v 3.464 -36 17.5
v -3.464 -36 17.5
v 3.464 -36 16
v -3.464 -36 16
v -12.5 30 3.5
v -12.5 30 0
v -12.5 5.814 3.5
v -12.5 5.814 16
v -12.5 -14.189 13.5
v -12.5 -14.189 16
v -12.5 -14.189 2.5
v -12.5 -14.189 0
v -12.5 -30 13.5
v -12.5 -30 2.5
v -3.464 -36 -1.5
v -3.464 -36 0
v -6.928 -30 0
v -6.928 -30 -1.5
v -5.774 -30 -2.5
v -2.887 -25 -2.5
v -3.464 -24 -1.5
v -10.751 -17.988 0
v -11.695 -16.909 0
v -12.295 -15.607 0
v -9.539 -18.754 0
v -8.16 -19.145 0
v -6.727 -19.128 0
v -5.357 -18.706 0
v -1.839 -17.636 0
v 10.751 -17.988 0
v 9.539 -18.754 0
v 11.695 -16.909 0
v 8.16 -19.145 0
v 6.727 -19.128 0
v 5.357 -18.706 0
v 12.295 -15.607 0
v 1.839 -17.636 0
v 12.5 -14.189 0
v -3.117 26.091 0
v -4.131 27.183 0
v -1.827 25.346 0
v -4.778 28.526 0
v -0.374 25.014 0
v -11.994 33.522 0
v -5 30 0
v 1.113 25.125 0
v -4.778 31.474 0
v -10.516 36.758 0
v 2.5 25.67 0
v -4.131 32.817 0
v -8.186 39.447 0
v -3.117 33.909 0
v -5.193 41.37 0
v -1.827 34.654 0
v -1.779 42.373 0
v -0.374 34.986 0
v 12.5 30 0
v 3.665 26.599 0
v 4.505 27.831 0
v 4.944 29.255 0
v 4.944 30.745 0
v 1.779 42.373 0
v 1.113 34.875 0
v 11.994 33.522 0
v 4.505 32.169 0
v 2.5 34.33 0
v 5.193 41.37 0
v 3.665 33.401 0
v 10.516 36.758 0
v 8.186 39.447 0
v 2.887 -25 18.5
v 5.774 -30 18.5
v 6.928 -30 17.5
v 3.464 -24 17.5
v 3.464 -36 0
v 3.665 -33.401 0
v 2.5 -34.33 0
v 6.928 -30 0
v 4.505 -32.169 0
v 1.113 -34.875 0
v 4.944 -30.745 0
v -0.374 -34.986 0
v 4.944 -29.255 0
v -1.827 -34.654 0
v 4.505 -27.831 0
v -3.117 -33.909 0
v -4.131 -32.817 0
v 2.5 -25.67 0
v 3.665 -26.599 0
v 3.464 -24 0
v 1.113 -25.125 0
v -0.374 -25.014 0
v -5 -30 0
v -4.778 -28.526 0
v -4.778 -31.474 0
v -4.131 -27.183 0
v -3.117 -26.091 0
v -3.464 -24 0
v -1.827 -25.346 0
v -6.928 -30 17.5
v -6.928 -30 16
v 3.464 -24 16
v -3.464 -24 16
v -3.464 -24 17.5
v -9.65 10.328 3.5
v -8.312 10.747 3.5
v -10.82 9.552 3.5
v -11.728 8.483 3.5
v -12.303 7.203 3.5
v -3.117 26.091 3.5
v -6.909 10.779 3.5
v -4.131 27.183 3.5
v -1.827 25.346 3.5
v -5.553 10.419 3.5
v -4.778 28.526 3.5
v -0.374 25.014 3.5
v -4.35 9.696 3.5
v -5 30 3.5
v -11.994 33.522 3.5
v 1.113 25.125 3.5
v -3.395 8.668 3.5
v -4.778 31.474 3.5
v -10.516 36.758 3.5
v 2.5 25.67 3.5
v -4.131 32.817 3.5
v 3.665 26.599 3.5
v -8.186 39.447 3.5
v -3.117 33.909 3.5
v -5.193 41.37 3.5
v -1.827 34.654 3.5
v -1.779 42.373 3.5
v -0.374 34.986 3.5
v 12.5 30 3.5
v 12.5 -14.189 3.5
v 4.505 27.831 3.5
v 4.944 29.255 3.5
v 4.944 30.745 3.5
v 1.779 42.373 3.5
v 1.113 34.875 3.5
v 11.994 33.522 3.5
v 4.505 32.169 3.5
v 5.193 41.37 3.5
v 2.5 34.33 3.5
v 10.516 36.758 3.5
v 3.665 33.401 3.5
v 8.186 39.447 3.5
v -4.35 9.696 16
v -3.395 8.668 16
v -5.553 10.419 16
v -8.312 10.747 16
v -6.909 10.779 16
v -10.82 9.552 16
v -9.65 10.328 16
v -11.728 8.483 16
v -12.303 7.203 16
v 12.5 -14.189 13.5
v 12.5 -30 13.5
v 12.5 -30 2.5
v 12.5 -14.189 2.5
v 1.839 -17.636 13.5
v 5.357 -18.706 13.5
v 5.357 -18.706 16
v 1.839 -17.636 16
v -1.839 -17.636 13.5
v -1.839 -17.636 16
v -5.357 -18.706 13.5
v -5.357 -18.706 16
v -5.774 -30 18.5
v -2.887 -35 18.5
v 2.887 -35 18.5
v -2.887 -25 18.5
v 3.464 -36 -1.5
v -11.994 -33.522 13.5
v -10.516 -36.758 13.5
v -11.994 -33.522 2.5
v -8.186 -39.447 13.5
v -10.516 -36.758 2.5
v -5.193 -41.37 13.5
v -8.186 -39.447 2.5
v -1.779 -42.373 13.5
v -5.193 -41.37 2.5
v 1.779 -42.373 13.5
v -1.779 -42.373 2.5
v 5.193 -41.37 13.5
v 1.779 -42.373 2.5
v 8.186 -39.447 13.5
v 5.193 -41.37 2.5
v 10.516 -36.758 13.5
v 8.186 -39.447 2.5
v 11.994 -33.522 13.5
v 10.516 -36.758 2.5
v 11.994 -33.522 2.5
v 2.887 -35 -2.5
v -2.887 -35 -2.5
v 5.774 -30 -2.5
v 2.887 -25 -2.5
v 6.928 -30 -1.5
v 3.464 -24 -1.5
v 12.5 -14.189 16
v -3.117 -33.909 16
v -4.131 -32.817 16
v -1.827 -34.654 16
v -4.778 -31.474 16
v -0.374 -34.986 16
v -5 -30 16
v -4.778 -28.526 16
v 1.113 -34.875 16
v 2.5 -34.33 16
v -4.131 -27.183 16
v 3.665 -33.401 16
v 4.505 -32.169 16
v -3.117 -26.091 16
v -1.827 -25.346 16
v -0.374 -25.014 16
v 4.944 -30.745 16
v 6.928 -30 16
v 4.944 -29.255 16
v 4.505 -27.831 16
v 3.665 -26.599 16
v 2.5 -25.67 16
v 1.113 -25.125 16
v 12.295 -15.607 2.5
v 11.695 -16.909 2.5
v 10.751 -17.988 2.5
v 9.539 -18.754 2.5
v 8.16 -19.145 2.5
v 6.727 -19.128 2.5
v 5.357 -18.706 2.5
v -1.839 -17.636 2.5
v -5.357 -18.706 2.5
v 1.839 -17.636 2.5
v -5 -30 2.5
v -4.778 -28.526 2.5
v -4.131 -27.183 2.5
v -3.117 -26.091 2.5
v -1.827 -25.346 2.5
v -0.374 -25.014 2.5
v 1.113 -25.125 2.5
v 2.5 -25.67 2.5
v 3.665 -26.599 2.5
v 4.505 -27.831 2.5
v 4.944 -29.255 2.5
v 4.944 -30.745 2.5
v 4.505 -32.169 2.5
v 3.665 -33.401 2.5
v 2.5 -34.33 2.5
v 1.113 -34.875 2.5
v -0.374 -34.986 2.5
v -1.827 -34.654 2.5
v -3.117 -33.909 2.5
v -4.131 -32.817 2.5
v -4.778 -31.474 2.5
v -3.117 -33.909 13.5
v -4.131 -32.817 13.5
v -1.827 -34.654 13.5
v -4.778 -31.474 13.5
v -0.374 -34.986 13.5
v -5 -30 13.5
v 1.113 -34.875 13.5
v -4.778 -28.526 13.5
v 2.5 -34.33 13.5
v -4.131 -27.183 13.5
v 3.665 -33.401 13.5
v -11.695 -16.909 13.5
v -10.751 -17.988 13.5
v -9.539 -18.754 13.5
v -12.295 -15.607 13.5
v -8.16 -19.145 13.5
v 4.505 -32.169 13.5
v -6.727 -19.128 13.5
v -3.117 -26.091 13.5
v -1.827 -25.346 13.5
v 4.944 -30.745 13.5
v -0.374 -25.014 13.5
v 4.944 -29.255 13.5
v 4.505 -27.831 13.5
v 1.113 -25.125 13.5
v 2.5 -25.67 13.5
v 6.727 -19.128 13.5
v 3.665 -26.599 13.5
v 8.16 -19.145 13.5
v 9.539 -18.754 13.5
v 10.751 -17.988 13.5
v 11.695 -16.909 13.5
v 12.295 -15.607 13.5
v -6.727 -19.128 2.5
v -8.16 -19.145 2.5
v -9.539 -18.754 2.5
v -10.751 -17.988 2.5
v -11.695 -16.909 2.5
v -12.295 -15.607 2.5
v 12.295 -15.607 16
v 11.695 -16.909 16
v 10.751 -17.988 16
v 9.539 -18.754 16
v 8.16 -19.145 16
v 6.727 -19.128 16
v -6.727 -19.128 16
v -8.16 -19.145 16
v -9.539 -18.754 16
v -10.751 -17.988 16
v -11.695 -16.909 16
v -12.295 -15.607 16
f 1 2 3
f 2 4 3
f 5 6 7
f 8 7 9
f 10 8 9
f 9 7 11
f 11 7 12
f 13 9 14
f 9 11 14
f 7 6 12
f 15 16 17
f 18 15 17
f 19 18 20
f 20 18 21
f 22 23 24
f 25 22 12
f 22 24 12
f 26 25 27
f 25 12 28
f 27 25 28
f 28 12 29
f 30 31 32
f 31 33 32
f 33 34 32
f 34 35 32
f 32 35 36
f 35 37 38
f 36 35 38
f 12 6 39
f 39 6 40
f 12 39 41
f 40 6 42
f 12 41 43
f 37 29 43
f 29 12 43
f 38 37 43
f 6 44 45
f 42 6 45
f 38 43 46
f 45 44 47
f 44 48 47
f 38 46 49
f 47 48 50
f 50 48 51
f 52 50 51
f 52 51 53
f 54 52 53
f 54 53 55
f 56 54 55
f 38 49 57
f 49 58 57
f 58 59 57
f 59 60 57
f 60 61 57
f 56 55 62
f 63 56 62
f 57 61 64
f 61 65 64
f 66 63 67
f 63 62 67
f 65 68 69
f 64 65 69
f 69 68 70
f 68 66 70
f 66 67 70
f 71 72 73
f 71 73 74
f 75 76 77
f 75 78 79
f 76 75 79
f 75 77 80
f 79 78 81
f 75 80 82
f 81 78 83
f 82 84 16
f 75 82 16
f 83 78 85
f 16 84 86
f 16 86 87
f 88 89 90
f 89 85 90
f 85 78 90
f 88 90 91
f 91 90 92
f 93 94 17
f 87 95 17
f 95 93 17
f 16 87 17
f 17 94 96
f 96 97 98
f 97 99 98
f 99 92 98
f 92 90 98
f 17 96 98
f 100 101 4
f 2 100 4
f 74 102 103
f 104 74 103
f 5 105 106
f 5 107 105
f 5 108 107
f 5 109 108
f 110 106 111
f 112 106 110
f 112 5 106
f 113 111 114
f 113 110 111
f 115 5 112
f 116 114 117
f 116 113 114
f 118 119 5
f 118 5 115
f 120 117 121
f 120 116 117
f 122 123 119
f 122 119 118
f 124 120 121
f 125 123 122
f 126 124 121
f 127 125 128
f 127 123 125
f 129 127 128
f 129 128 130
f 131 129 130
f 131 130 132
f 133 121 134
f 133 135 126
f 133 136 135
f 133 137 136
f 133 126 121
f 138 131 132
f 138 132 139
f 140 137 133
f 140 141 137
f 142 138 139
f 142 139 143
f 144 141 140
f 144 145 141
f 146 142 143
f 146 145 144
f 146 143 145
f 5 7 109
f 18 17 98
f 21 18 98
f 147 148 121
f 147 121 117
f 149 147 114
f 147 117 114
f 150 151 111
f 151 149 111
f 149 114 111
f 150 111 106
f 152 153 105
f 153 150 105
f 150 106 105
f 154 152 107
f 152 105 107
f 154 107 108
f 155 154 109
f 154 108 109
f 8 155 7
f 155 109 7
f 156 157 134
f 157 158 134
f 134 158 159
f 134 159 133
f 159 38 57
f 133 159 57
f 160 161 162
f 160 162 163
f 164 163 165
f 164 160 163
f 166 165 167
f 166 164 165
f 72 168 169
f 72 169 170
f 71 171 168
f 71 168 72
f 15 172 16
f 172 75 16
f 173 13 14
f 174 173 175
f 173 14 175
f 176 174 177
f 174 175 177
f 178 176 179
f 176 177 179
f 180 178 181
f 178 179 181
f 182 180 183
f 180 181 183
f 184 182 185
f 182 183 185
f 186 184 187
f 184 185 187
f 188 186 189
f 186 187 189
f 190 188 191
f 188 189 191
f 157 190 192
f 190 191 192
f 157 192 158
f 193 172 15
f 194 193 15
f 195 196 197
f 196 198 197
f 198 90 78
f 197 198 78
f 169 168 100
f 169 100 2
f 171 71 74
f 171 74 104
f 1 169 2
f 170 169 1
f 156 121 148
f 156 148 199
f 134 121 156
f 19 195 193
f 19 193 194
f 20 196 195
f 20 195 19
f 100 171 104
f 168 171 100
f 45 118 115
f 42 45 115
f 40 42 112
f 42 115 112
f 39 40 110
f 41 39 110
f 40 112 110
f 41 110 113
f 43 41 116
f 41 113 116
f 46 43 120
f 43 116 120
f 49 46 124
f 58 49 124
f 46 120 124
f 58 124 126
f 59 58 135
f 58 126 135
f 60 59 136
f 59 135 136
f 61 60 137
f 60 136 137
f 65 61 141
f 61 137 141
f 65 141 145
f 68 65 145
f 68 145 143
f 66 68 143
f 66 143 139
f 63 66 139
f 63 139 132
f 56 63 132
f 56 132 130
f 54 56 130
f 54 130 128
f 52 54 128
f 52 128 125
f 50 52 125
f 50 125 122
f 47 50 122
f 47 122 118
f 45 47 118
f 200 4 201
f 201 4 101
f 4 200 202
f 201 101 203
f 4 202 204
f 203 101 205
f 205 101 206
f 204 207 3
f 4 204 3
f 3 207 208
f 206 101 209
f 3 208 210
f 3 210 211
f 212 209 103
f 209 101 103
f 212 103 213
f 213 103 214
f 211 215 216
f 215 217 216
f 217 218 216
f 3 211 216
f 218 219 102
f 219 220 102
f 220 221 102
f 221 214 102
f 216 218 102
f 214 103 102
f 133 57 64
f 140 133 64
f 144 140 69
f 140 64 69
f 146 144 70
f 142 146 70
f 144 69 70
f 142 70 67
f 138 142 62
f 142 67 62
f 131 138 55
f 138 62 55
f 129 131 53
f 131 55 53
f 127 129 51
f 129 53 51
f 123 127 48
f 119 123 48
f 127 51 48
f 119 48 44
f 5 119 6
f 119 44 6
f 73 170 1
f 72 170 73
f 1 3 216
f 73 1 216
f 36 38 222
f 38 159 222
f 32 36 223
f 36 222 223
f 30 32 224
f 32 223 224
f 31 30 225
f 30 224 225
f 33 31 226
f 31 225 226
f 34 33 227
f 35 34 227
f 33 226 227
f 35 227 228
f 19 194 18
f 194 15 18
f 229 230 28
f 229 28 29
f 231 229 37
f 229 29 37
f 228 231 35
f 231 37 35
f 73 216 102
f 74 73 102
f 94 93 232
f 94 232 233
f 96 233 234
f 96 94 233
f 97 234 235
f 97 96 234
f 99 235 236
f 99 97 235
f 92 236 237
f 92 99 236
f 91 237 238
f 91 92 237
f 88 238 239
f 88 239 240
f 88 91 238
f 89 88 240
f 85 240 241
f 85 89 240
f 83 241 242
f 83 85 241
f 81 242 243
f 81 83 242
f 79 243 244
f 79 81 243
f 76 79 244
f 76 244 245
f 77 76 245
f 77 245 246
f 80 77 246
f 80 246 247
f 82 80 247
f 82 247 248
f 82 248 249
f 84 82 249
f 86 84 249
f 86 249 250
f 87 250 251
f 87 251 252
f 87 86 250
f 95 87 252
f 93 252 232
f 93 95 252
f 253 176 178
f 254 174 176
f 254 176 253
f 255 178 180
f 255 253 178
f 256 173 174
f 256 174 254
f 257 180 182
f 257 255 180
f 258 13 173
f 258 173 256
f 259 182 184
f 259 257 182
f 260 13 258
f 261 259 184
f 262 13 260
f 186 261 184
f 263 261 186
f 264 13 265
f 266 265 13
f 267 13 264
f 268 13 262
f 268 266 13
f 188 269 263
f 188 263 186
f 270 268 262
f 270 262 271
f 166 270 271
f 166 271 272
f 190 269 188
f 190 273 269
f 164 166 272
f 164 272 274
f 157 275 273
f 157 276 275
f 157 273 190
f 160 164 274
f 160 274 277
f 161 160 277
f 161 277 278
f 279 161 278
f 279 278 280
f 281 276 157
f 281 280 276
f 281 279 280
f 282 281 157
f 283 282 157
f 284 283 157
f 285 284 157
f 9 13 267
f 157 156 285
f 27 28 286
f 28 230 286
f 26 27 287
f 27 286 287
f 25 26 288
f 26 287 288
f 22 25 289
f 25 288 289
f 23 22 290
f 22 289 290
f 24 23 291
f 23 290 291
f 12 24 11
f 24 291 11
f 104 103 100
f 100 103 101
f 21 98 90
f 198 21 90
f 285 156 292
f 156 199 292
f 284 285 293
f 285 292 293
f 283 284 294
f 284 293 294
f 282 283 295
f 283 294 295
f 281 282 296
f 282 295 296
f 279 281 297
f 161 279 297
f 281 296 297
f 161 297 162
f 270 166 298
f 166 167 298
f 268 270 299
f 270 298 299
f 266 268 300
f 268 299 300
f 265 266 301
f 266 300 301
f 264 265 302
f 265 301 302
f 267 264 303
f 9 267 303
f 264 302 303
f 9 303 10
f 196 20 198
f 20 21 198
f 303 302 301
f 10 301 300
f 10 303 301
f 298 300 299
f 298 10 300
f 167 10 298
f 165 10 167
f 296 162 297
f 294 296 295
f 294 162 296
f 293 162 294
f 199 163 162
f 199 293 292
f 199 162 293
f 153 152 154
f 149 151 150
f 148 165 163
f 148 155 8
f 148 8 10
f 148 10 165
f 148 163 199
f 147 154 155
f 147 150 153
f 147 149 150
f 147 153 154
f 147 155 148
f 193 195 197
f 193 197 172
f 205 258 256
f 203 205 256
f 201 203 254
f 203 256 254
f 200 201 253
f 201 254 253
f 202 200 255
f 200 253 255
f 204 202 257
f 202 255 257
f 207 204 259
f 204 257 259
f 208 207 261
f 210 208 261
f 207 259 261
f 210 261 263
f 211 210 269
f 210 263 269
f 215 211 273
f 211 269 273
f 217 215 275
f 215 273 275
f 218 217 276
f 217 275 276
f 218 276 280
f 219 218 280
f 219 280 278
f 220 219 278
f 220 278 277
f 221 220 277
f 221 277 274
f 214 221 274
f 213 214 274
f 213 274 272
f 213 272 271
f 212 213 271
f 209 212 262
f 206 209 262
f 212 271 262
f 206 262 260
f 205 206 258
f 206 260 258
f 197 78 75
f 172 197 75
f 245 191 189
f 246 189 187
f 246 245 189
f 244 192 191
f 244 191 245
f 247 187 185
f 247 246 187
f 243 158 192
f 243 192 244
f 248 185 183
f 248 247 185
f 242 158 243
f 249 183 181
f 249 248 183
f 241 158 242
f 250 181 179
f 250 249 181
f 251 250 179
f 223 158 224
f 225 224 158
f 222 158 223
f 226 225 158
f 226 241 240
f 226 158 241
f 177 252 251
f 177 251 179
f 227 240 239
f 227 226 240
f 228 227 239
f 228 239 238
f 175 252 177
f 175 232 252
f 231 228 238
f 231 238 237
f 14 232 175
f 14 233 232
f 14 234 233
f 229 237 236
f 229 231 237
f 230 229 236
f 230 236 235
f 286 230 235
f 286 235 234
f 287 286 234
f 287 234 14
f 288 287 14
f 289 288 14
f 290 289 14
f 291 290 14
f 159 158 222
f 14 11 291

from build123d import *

# Parameters (mm, degrees)
CROQUIS1_R              = 12.5
CROQUIS1_R_2            = 7.5
CROQUIS1_R_3            = 5
SALIENTE_EXTRUIR2_DEPTH = 16
CROQUIS2_R              = 12.5
CROQUIS2_R_2            = 5
CORTAR_EXTRUIR1_DEPTH   = 2.5
REDONDEO2_R             = 5
REDONDEO3_R             = 5
CORTAR_EXTRUIR3_START   = -2.5
CROQUIS3_R              = 12.5
CROQUIS3_R_2            = 5
CORTAR_EXTRUIR3_DEPTH   = 2.5
REDONDEO6_R             = 5
REDONDEO7_R             = 5
SALIENTE_EXTRUIR3_DEPTH = 2.5
SALIENTE_EXTRUIR4_DEPTH = 2.5
CHAFL_N2_SIZE           = 1
CHAFL_N3_SIZE           = 1
CHAFL_N4_SIZE           = 1
CHAFL_N5_SIZE           = 1
CHAFL_N6_SIZE           = 1
CHAFL_N7_SIZE           = 1
CHAFL_N8_SIZE           = 1
CHAFL_N9_SIZE           = 1
CHAFL_N10_SIZE          = 1
CHAFL_N11_SIZE          = 1
CHAFL_N12_SIZE          = 1
CHAFL_N13_SIZE          = 1
CORTAR_EXTRUIR4_START   = -12.5
CORTAR_EXTRUIR4_DEPTH   = 12.5
REDONDEO8_START         = 3.5
REDONDEO8_DEPTH         = 13.5
REDONDEO9_START         = 3.5
REDONDEO9_DEPTH         = 13.5
CORTAR_EXTRUIR5_DEPTH   = 12.5
CORTAR_EXTRUIR6_START   = -12.5
CORTAR_EXTRUIR6_DEPTH   = 12.5
REDONDEO11_R            = 5


with BuildPart() as part:
    # Croquis1 → Saliente-Extruir2 (new body)
    with BuildSketch(Plane.XY):
        with BuildLine():
            ThreePointArc((12.5, 30), (0, 42.5), (-12.5, 30))
            Line((-12.5, 30), (-5, 30))
            ThreePointArc((-5, 30), (0, 35), (5, 30))
            Line((5, 30), (12.5, 30))
        make_face()
        with BuildLine():
            ThreePointArc((5, 30), (0, 35), (-5, 30))
            Line((-5, 30), (5, 30))
        make_face()
        with BuildLine():
            Line((5, 30), (-5, 30))
            ThreePointArc((-5, 30), (0, 25), (5, 30))
        make_face()
        with BuildLine():
            ThreePointArc((-12.5, 30), (-11.180339887, 24.409830056), (-7.5, 20))
            Line((-7.5, 20), (7.5, 20))
            ThreePointArc((7.5, 20), (11.180339887, 24.409830056), (12.5, 30))
            Line((12.5, 30), (5, 30))
            ThreePointArc((5, 30), (0, 25), (-5, 30))
            Line((-5, 30), (-12.5, 30))
        make_face()
        with BuildLine():
            Line((7.5, 20), (-7.5, 20))
            ThreePointArc((-7.5, 20), (0, 17.5), (7.5, 20))
        make_face()
        with BuildLine():
            ThreePointArc((-12.5, -30), (-11.180339887, -24.409830056), (-7.5, -20))
            Line((-7.5, -20), (-7.5, 20))
            ThreePointArc((-7.5, 20), (-11.180339887, 24.409830056), (-12.5, 30))
            Line((-12.5, 30), (-12.5, -30))
        make_face()
        with BuildLine():
            Line((7.5, 20), (7.5, -20))
            ThreePointArc((7.5, -20), (11.180339887, -24.409830056), (12.5, -30))
            Line((12.5, -30), (12.5, 30))
            ThreePointArc((12.5, 30), (11.180339887, 24.409830056), (7.5, 20))
        make_face()
        with BuildLine():
            Line((-7.5, 20), (-7.5, -20))
            ThreePointArc((-7.5, -20), (0, -12.5), (7.5, -20))
            Line((7.5, -20), (7.5, 20))
            ThreePointArc((7.5, 20), (0, 17.5), (-7.5, 20))
        make_face()
        with Locations((0, -30)):
            Circle(CROQUIS1_R)
        with Locations((0, -20)):
            Circle(CROQUIS1_R_2)
        with BuildLine():
            ThreePointArc((7.5, -20), (0, -17.5), (-7.5, -20))
            Line((-7.5, -20), (7.5, -20))
        make_face()
        with BuildLine():
            Line((7.5, -20), (-7.5, -20))
            ThreePointArc((-7.5, -20), (-6.460724191, -23.809073762), (-3.630921887, -26.5625))
            ThreePointArc((-3.630921887, -26.5625), (0, -25), (3.630921887, -26.5625))
            ThreePointArc((3.630921887, -26.5625), (6.460724191, -23.809073762), (7.5, -20))
        make_face()
        with BuildLine():
            ThreePointArc((-3.630921887, -26.5625), (-6.460724191, -23.809073762), (-7.5, -20))
            ThreePointArc((-7.5, -20), (-11.180339887, -24.409830056), (-12.5, -30))
            Line((-12.5, -30), (-5, -30))
            ThreePointArc((-5, -30), (-4.64513775, -28.149947222), (-3.630921887, -26.5625))
        make_face()
        with BuildLine():
            ThreePointArc((12.5, -30), (11.180339887, -24.409830056), (7.5, -20))
            ThreePointArc((7.5, -20), (6.460724191, -23.809073762), (3.630921887, -26.5625))
            ThreePointArc((3.630921887, -26.5625), (4.64513775, -28.149947222), (5, -30))
            Line((5, -30), (12.5, -30))
        make_face()
        with BuildLine():
            Line((-5, -30), (-12.5, -30))
            ThreePointArc((-12.5, -30), (0, -42.5), (12.5, -30))
            Line((12.5, -30), (5, -30))
            ThreePointArc((5, -30), (0, -35), (-5, -30))
        make_face()
        with Locations((0, -30)):
            Circle(CROQUIS1_R_3)
        with BuildLine():
            ThreePointArc((3.630921887, -26.5625), (0, -27.5), (-3.630921887, -26.5625))
            ThreePointArc((-3.630921887, -26.5625), (-4.64513775, -28.149947222), (-5, -30))
            Line((-5, -30), (5, -30))
            ThreePointArc((5, -30), (4.64513775, -28.149947222), (3.630921887, -26.5625))
        make_face()
        with BuildLine():
            Line((5, -30), (-5, -30))
            ThreePointArc((-5, -30), (0, -35), (5, -30))
        make_face()
    extrude(amount=SALIENTE_EXTRUIR2_DEPTH)

    # Croquis2 → Cortar-Extruir1 (cut)
    with BuildSketch(Plane(origin=(0, 0, 0), x_dir=(-1, 0, 0), z_dir=(0, 0, -1))):
        with Locations((0, -30)):
            Circle(CROQUIS2_R)
        with Locations((0, -30)):
            Circle(CROQUIS2_R_2, mode=Mode.SUBTRACT)
    extrude(amount=-CORTAR_EXTRUIR1_DEPTH, mode=Mode.SUBTRACT)

    # Redondeo2
    redondeo2_edges = [part.edges().sort_by_distance(p)[0] for p in [
        (12.5, -30, 1.25),
    ]]
    fillet(redondeo2_edges, radius=REDONDEO2_R)

    # Redondeo3
    redondeo3_edges = [part.edges().sort_by_distance(p)[0] for p in [
        (-12.5, -30, 1.25),
    ]]
    fillet(redondeo3_edges, radius=REDONDEO3_R)

    # Croquis3 → Cortar-Extruir3 (cut)
    with BuildSketch(Plane.XY.offset(16).offset(CORTAR_EXTRUIR3_START)):
        with Locations((0, -30)):
            Circle(CROQUIS3_R)
        with Locations(Location((0, -30, 0), (0, 0, 180))):
            Circle(CROQUIS3_R_2, mode=Mode.SUBTRACT)
    extrude(amount=CORTAR_EXTRUIR3_DEPTH, mode=Mode.SUBTRACT)

    # Redondeo6
    redondeo6_edges = [part.edges().sort_by_distance(p)[0] for p in [
        (12.5, -30, 14.75),
    ]]
    fillet(redondeo6_edges, radius=REDONDEO6_R)

    # Redondeo7
    redondeo7_edges = [part.edges().sort_by_distance(p)[0] for p in [
        (-12.5, -30, 14.75),
    ]]
    fillet(redondeo7_edges, radius=REDONDEO7_R)

    # Croquis4 → Saliente-Extruir3 (add)
    with BuildSketch(Plane.XY.offset(16)):
        Polygon((6.92820323, -30), (3.464101615, -24), (-3.464101615, -24), (-6.92820323, -30), (-3.464101615, -36), (3.464101615, -36), align=None)
    extrude(amount=SALIENTE_EXTRUIR3_DEPTH)

    # Croquis5 → Saliente-Extruir4 (add)
    with BuildSketch(Plane(origin=(0, 0, 0), x_dir=(-1, 0, 0), z_dir=(0, 0, -1))):
        Polygon((6.92820323, -30), (3.464101615, -24), (-3.464101615, -24), (-6.92820323, -30), (-3.464101615, -36), (3.464101615, -36), align=None)
    extrude(amount=SALIENTE_EXTRUIR4_DEPTH)

    # Chaflán2
    chafl_n2_edges = [part.edges().sort_by_distance(p)[0] for p in [
        (5.196152423, -33, 18.5),
    ]]
    chamfer(chafl_n2_edges, length=CHAFL_N2_SIZE)

    # Chaflán3
    chafl_n3_edges = [part.edges().sort_by_distance(p)[0] for p in [
        (4.907477288, -26.5, 18.5),
    ]]
    chamfer(chafl_n3_edges, length=CHAFL_N3_SIZE)

    # Chaflán4
    chafl_n4_edges = [part.edges().sort_by_distance(p)[0] for p in [
        (-0.577350269, -24, 18.5),
    ]]
    chamfer(chafl_n4_edges, length=CHAFL_N4_SIZE)

    # Chaflán5
    chafl_n5_edges = [part.edges().sort_by_distance(p)[0] for p in [
        (-5.484827557, -27.5, 18.5),
    ]]
    chamfer(chafl_n5_edges, length=CHAFL_N5_SIZE)

    # Chaflán6
    chafl_n6_edges = [part.edges().sort_by_distance(p)[0] for p in [
        (-4.907477288, -33.5, 18.5),
    ]]
    chamfer(chafl_n6_edges, length=CHAFL_N6_SIZE)

    # Chaflán7
    chafl_n7_edges = [part.edges().sort_by_distance(p)[0] for p in [
        (0, -36, 18.5),
    ]]
    chamfer(chafl_n7_edges, length=CHAFL_N7_SIZE)

    # Chaflán8
    chafl_n8_edges = [part.edges().sort_by_distance(p)[0] for p in [
        (5.196152423, -33, -2.5),
    ]]
    chamfer(chafl_n8_edges, length=CHAFL_N8_SIZE)

    # Chaflán9
    chafl_n9_edges = [part.edges().sort_by_distance(p)[0] for p in [
        (4.907477288, -26.5, -2.5),
    ]]
    chamfer(chafl_n9_edges, length=CHAFL_N9_SIZE)

    # Chaflán10
    chafl_n10_edges = [part.edges().sort_by_distance(p)[0] for p in [
        (-0.577350269, -24, -2.5),
    ]]
    chamfer(chafl_n10_edges, length=CHAFL_N10_SIZE)

    # Chaflán11
    chafl_n11_edges = [part.edges().sort_by_distance(p)[0] for p in [
        (-5.484827557, -27.5, -2.5),
    ]]
    chamfer(chafl_n11_edges, length=CHAFL_N11_SIZE)

    # Chaflán12
    chafl_n12_edges = [part.edges().sort_by_distance(p)[0] for p in [
        (-4.907477288, -33.5, -2.5),
    ]]
    chamfer(chafl_n12_edges, length=CHAFL_N12_SIZE)

    # Chaflán13
    chafl_n13_edges = [part.edges().sort_by_distance(p)[0] for p in [
        (0, -36, -2.5),
    ]]
    chamfer(chafl_n13_edges, length=CHAFL_N13_SIZE)

    # Croquis6 → Cortar-Extruir4 (cut)
    with BuildSketch(Plane.XY.offset(16).offset(CORTAR_EXTRUIR4_START)):
        with BuildLine():
            ThreePointArc((12.5, 30), (0, 42.5), (-12.5, 30))
            Line((-12.5, 30), (12.5, 30))
        make_face()
        with BuildLine():
            Line((12.5, 30), (-12.5, 30))
            ThreePointArc((-12.5, 30), (0, 17.5), (12.5, 30))
        make_face()
        with BuildLine():
            Line((-12.5, 30), (12.5, 30))
            ThreePointArc((12.5, 30), (0, 42.5), (-12.5, 30))
        make_face()
    extrude(amount=CORTAR_EXTRUIR4_DEPTH, mode=Mode.SUBTRACT)

    # Redondeo8: read off the stored shape, not the designer's step
    # Redondeo8 outline → Redondeo8 (cut)
    with BuildSketch(Plane.XY.offset(REDONDEO8_START)):
        with BuildLine():
            ThreePointArc((-12.5, 14.188611699), (-10.172612419, 18.414382973), (-5.357142857, 18.706151214))
            ThreePointArc((-5.357142857, 18.706151214), (-10.564428184, 23.318468952), (-12.5, 30))
            Line((-12.5, 30), (-12.5, 14.188611699))
        make_face()
    extrude(amount=REDONDEO8_DEPTH, mode=Mode.SUBTRACT)

    # Redondeo9: read off the stored shape, not the designer's step
    # Redondeo9 outline → Redondeo9 (cut)
    with BuildSketch(Plane.XY.offset(REDONDEO9_START)):
        with BuildLine():
            ThreePointArc((5.357142857, 18.706151214), (10.172612419, 18.414382973), (12.5, 14.188611699))
            Line((12.5, 14.188611699), (12.5, 30))
            ThreePointArc((12.5, 30), (10.564428184, 23.318468952), (5.357142857, 18.706151214))
        make_face()
    extrude(amount=REDONDEO9_DEPTH, mode=Mode.SUBTRACT)

    # Croquis7 → Cortar-Extruir5 (cut)
    with BuildSketch(Plane.XY.offset(3.5)):
        with BuildLine():
            ThreePointArc((5, 30), (0, 35), (-5, 30))
            Line((-5, 30), (5, 30))
        make_face()
        with BuildLine():
            Line((5, 30), (-5, 30))
            ThreePointArc((-5, 30), (0, 25), (5, 30))
        make_face()
    extrude(amount=-CORTAR_EXTRUIR5_DEPTH, mode=Mode.SUBTRACT)

    # Croquis8 → Cortar-Extruir6 (cut)
    with BuildSketch(Plane.XY.offset(16).offset(CORTAR_EXTRUIR6_START)):
        with BuildLine():
            Line((-10.172612419, 18.414382973), (12.5, -14.188611699))
            Line((12.5, -14.188611699), (12.5, 14.188611699))
            ThreePointArc((12.5, 14.188611699), (10.172612419, 18.414382973), (5.357142857, 18.706151214))
            ThreePointArc((5.357142857, 18.706151214), (0, 17.5), (-5.357142857, 18.706151214))
            ThreePointArc((-5.357142857, 18.706151214), (-7.802394345, 19.179459088), (-10.172612419, 18.414382973))
        make_face()
    extrude(amount=CORTAR_EXTRUIR6_DEPTH, mode=Mode.SUBTRACT)

    # Redondeo11
    # the kernel refuses this fillet: 5 mm, written as the material it takes off along each edge
    with BuildSketch(Plane(origin=(-10.172612419, 18.414382973, 3.5), x_dir=(-0.181629701396011, -0.9833669973976125, 0), z_dir=(0, 0, 1))) as redondeo11_piece_1:
        with BuildLine():
            CenterArc((11.905766635, 4.916834987), REDONDEO11_R, 135.280031418, 145.184668291)
            Line((8.352995208, 8.435046918), (7.997718065, 8.786868111))
            Line((7.997718065, 8.786868111), (-0.355277143, 0.351821193))
            Line((-0.355277143, 0.351821193), (-0.367005821, -0.339568442))
            ThreePointArc((-0.367005821, -0.339568442), (4.669021571, -2.012834061), (12.904729992, -0.491683499))
            Line((12.904729992, -0.491683499), (12.813915142, 0))
        make_face()
    extrude(amount=44.534787854, mode=Mode.SUBTRACT)


solid = part.part
